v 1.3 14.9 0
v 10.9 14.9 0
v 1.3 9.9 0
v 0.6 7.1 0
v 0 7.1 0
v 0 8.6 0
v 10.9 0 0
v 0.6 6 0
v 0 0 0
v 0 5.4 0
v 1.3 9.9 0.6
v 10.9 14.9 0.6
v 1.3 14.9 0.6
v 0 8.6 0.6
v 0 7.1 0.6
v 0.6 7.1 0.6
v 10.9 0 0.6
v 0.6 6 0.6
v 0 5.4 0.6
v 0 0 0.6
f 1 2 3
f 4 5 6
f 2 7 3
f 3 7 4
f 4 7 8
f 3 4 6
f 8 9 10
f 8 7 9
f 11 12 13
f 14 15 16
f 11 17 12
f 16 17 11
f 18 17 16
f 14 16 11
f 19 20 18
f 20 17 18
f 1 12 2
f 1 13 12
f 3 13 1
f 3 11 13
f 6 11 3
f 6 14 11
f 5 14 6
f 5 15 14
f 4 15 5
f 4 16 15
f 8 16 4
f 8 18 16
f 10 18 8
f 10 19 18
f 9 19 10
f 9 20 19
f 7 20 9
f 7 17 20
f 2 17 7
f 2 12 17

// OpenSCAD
// data taken from
// https://www.sparkfun.com/datasheets/Prototyping/microSD_Spec.pdf
// total card width

A = 10.9;
A1 = 9.6;

A8 = 0.6;

B = 14.9;

B1 = 6.3;

B10 = 7.8;

B11 = 1.1;

C1 = 0.6;

A_ = A - A1;

B_ = B - B1 + A_;

linear_extrude(height = C1) {

    polygon(points = [
        [ 0, 0 ],
        [ A, 0 ],
        [ A, B ],
        [ A_, B ],
        [ A_, B_ ],
        [ 0, B - B1 ],
        [ 0, B - B10 ],
        [ A8, B - B10 ],
        [ A8, B - B10 - B11 ],
        [ 0, B - B10 - B11 - A8 ] ]);

};
